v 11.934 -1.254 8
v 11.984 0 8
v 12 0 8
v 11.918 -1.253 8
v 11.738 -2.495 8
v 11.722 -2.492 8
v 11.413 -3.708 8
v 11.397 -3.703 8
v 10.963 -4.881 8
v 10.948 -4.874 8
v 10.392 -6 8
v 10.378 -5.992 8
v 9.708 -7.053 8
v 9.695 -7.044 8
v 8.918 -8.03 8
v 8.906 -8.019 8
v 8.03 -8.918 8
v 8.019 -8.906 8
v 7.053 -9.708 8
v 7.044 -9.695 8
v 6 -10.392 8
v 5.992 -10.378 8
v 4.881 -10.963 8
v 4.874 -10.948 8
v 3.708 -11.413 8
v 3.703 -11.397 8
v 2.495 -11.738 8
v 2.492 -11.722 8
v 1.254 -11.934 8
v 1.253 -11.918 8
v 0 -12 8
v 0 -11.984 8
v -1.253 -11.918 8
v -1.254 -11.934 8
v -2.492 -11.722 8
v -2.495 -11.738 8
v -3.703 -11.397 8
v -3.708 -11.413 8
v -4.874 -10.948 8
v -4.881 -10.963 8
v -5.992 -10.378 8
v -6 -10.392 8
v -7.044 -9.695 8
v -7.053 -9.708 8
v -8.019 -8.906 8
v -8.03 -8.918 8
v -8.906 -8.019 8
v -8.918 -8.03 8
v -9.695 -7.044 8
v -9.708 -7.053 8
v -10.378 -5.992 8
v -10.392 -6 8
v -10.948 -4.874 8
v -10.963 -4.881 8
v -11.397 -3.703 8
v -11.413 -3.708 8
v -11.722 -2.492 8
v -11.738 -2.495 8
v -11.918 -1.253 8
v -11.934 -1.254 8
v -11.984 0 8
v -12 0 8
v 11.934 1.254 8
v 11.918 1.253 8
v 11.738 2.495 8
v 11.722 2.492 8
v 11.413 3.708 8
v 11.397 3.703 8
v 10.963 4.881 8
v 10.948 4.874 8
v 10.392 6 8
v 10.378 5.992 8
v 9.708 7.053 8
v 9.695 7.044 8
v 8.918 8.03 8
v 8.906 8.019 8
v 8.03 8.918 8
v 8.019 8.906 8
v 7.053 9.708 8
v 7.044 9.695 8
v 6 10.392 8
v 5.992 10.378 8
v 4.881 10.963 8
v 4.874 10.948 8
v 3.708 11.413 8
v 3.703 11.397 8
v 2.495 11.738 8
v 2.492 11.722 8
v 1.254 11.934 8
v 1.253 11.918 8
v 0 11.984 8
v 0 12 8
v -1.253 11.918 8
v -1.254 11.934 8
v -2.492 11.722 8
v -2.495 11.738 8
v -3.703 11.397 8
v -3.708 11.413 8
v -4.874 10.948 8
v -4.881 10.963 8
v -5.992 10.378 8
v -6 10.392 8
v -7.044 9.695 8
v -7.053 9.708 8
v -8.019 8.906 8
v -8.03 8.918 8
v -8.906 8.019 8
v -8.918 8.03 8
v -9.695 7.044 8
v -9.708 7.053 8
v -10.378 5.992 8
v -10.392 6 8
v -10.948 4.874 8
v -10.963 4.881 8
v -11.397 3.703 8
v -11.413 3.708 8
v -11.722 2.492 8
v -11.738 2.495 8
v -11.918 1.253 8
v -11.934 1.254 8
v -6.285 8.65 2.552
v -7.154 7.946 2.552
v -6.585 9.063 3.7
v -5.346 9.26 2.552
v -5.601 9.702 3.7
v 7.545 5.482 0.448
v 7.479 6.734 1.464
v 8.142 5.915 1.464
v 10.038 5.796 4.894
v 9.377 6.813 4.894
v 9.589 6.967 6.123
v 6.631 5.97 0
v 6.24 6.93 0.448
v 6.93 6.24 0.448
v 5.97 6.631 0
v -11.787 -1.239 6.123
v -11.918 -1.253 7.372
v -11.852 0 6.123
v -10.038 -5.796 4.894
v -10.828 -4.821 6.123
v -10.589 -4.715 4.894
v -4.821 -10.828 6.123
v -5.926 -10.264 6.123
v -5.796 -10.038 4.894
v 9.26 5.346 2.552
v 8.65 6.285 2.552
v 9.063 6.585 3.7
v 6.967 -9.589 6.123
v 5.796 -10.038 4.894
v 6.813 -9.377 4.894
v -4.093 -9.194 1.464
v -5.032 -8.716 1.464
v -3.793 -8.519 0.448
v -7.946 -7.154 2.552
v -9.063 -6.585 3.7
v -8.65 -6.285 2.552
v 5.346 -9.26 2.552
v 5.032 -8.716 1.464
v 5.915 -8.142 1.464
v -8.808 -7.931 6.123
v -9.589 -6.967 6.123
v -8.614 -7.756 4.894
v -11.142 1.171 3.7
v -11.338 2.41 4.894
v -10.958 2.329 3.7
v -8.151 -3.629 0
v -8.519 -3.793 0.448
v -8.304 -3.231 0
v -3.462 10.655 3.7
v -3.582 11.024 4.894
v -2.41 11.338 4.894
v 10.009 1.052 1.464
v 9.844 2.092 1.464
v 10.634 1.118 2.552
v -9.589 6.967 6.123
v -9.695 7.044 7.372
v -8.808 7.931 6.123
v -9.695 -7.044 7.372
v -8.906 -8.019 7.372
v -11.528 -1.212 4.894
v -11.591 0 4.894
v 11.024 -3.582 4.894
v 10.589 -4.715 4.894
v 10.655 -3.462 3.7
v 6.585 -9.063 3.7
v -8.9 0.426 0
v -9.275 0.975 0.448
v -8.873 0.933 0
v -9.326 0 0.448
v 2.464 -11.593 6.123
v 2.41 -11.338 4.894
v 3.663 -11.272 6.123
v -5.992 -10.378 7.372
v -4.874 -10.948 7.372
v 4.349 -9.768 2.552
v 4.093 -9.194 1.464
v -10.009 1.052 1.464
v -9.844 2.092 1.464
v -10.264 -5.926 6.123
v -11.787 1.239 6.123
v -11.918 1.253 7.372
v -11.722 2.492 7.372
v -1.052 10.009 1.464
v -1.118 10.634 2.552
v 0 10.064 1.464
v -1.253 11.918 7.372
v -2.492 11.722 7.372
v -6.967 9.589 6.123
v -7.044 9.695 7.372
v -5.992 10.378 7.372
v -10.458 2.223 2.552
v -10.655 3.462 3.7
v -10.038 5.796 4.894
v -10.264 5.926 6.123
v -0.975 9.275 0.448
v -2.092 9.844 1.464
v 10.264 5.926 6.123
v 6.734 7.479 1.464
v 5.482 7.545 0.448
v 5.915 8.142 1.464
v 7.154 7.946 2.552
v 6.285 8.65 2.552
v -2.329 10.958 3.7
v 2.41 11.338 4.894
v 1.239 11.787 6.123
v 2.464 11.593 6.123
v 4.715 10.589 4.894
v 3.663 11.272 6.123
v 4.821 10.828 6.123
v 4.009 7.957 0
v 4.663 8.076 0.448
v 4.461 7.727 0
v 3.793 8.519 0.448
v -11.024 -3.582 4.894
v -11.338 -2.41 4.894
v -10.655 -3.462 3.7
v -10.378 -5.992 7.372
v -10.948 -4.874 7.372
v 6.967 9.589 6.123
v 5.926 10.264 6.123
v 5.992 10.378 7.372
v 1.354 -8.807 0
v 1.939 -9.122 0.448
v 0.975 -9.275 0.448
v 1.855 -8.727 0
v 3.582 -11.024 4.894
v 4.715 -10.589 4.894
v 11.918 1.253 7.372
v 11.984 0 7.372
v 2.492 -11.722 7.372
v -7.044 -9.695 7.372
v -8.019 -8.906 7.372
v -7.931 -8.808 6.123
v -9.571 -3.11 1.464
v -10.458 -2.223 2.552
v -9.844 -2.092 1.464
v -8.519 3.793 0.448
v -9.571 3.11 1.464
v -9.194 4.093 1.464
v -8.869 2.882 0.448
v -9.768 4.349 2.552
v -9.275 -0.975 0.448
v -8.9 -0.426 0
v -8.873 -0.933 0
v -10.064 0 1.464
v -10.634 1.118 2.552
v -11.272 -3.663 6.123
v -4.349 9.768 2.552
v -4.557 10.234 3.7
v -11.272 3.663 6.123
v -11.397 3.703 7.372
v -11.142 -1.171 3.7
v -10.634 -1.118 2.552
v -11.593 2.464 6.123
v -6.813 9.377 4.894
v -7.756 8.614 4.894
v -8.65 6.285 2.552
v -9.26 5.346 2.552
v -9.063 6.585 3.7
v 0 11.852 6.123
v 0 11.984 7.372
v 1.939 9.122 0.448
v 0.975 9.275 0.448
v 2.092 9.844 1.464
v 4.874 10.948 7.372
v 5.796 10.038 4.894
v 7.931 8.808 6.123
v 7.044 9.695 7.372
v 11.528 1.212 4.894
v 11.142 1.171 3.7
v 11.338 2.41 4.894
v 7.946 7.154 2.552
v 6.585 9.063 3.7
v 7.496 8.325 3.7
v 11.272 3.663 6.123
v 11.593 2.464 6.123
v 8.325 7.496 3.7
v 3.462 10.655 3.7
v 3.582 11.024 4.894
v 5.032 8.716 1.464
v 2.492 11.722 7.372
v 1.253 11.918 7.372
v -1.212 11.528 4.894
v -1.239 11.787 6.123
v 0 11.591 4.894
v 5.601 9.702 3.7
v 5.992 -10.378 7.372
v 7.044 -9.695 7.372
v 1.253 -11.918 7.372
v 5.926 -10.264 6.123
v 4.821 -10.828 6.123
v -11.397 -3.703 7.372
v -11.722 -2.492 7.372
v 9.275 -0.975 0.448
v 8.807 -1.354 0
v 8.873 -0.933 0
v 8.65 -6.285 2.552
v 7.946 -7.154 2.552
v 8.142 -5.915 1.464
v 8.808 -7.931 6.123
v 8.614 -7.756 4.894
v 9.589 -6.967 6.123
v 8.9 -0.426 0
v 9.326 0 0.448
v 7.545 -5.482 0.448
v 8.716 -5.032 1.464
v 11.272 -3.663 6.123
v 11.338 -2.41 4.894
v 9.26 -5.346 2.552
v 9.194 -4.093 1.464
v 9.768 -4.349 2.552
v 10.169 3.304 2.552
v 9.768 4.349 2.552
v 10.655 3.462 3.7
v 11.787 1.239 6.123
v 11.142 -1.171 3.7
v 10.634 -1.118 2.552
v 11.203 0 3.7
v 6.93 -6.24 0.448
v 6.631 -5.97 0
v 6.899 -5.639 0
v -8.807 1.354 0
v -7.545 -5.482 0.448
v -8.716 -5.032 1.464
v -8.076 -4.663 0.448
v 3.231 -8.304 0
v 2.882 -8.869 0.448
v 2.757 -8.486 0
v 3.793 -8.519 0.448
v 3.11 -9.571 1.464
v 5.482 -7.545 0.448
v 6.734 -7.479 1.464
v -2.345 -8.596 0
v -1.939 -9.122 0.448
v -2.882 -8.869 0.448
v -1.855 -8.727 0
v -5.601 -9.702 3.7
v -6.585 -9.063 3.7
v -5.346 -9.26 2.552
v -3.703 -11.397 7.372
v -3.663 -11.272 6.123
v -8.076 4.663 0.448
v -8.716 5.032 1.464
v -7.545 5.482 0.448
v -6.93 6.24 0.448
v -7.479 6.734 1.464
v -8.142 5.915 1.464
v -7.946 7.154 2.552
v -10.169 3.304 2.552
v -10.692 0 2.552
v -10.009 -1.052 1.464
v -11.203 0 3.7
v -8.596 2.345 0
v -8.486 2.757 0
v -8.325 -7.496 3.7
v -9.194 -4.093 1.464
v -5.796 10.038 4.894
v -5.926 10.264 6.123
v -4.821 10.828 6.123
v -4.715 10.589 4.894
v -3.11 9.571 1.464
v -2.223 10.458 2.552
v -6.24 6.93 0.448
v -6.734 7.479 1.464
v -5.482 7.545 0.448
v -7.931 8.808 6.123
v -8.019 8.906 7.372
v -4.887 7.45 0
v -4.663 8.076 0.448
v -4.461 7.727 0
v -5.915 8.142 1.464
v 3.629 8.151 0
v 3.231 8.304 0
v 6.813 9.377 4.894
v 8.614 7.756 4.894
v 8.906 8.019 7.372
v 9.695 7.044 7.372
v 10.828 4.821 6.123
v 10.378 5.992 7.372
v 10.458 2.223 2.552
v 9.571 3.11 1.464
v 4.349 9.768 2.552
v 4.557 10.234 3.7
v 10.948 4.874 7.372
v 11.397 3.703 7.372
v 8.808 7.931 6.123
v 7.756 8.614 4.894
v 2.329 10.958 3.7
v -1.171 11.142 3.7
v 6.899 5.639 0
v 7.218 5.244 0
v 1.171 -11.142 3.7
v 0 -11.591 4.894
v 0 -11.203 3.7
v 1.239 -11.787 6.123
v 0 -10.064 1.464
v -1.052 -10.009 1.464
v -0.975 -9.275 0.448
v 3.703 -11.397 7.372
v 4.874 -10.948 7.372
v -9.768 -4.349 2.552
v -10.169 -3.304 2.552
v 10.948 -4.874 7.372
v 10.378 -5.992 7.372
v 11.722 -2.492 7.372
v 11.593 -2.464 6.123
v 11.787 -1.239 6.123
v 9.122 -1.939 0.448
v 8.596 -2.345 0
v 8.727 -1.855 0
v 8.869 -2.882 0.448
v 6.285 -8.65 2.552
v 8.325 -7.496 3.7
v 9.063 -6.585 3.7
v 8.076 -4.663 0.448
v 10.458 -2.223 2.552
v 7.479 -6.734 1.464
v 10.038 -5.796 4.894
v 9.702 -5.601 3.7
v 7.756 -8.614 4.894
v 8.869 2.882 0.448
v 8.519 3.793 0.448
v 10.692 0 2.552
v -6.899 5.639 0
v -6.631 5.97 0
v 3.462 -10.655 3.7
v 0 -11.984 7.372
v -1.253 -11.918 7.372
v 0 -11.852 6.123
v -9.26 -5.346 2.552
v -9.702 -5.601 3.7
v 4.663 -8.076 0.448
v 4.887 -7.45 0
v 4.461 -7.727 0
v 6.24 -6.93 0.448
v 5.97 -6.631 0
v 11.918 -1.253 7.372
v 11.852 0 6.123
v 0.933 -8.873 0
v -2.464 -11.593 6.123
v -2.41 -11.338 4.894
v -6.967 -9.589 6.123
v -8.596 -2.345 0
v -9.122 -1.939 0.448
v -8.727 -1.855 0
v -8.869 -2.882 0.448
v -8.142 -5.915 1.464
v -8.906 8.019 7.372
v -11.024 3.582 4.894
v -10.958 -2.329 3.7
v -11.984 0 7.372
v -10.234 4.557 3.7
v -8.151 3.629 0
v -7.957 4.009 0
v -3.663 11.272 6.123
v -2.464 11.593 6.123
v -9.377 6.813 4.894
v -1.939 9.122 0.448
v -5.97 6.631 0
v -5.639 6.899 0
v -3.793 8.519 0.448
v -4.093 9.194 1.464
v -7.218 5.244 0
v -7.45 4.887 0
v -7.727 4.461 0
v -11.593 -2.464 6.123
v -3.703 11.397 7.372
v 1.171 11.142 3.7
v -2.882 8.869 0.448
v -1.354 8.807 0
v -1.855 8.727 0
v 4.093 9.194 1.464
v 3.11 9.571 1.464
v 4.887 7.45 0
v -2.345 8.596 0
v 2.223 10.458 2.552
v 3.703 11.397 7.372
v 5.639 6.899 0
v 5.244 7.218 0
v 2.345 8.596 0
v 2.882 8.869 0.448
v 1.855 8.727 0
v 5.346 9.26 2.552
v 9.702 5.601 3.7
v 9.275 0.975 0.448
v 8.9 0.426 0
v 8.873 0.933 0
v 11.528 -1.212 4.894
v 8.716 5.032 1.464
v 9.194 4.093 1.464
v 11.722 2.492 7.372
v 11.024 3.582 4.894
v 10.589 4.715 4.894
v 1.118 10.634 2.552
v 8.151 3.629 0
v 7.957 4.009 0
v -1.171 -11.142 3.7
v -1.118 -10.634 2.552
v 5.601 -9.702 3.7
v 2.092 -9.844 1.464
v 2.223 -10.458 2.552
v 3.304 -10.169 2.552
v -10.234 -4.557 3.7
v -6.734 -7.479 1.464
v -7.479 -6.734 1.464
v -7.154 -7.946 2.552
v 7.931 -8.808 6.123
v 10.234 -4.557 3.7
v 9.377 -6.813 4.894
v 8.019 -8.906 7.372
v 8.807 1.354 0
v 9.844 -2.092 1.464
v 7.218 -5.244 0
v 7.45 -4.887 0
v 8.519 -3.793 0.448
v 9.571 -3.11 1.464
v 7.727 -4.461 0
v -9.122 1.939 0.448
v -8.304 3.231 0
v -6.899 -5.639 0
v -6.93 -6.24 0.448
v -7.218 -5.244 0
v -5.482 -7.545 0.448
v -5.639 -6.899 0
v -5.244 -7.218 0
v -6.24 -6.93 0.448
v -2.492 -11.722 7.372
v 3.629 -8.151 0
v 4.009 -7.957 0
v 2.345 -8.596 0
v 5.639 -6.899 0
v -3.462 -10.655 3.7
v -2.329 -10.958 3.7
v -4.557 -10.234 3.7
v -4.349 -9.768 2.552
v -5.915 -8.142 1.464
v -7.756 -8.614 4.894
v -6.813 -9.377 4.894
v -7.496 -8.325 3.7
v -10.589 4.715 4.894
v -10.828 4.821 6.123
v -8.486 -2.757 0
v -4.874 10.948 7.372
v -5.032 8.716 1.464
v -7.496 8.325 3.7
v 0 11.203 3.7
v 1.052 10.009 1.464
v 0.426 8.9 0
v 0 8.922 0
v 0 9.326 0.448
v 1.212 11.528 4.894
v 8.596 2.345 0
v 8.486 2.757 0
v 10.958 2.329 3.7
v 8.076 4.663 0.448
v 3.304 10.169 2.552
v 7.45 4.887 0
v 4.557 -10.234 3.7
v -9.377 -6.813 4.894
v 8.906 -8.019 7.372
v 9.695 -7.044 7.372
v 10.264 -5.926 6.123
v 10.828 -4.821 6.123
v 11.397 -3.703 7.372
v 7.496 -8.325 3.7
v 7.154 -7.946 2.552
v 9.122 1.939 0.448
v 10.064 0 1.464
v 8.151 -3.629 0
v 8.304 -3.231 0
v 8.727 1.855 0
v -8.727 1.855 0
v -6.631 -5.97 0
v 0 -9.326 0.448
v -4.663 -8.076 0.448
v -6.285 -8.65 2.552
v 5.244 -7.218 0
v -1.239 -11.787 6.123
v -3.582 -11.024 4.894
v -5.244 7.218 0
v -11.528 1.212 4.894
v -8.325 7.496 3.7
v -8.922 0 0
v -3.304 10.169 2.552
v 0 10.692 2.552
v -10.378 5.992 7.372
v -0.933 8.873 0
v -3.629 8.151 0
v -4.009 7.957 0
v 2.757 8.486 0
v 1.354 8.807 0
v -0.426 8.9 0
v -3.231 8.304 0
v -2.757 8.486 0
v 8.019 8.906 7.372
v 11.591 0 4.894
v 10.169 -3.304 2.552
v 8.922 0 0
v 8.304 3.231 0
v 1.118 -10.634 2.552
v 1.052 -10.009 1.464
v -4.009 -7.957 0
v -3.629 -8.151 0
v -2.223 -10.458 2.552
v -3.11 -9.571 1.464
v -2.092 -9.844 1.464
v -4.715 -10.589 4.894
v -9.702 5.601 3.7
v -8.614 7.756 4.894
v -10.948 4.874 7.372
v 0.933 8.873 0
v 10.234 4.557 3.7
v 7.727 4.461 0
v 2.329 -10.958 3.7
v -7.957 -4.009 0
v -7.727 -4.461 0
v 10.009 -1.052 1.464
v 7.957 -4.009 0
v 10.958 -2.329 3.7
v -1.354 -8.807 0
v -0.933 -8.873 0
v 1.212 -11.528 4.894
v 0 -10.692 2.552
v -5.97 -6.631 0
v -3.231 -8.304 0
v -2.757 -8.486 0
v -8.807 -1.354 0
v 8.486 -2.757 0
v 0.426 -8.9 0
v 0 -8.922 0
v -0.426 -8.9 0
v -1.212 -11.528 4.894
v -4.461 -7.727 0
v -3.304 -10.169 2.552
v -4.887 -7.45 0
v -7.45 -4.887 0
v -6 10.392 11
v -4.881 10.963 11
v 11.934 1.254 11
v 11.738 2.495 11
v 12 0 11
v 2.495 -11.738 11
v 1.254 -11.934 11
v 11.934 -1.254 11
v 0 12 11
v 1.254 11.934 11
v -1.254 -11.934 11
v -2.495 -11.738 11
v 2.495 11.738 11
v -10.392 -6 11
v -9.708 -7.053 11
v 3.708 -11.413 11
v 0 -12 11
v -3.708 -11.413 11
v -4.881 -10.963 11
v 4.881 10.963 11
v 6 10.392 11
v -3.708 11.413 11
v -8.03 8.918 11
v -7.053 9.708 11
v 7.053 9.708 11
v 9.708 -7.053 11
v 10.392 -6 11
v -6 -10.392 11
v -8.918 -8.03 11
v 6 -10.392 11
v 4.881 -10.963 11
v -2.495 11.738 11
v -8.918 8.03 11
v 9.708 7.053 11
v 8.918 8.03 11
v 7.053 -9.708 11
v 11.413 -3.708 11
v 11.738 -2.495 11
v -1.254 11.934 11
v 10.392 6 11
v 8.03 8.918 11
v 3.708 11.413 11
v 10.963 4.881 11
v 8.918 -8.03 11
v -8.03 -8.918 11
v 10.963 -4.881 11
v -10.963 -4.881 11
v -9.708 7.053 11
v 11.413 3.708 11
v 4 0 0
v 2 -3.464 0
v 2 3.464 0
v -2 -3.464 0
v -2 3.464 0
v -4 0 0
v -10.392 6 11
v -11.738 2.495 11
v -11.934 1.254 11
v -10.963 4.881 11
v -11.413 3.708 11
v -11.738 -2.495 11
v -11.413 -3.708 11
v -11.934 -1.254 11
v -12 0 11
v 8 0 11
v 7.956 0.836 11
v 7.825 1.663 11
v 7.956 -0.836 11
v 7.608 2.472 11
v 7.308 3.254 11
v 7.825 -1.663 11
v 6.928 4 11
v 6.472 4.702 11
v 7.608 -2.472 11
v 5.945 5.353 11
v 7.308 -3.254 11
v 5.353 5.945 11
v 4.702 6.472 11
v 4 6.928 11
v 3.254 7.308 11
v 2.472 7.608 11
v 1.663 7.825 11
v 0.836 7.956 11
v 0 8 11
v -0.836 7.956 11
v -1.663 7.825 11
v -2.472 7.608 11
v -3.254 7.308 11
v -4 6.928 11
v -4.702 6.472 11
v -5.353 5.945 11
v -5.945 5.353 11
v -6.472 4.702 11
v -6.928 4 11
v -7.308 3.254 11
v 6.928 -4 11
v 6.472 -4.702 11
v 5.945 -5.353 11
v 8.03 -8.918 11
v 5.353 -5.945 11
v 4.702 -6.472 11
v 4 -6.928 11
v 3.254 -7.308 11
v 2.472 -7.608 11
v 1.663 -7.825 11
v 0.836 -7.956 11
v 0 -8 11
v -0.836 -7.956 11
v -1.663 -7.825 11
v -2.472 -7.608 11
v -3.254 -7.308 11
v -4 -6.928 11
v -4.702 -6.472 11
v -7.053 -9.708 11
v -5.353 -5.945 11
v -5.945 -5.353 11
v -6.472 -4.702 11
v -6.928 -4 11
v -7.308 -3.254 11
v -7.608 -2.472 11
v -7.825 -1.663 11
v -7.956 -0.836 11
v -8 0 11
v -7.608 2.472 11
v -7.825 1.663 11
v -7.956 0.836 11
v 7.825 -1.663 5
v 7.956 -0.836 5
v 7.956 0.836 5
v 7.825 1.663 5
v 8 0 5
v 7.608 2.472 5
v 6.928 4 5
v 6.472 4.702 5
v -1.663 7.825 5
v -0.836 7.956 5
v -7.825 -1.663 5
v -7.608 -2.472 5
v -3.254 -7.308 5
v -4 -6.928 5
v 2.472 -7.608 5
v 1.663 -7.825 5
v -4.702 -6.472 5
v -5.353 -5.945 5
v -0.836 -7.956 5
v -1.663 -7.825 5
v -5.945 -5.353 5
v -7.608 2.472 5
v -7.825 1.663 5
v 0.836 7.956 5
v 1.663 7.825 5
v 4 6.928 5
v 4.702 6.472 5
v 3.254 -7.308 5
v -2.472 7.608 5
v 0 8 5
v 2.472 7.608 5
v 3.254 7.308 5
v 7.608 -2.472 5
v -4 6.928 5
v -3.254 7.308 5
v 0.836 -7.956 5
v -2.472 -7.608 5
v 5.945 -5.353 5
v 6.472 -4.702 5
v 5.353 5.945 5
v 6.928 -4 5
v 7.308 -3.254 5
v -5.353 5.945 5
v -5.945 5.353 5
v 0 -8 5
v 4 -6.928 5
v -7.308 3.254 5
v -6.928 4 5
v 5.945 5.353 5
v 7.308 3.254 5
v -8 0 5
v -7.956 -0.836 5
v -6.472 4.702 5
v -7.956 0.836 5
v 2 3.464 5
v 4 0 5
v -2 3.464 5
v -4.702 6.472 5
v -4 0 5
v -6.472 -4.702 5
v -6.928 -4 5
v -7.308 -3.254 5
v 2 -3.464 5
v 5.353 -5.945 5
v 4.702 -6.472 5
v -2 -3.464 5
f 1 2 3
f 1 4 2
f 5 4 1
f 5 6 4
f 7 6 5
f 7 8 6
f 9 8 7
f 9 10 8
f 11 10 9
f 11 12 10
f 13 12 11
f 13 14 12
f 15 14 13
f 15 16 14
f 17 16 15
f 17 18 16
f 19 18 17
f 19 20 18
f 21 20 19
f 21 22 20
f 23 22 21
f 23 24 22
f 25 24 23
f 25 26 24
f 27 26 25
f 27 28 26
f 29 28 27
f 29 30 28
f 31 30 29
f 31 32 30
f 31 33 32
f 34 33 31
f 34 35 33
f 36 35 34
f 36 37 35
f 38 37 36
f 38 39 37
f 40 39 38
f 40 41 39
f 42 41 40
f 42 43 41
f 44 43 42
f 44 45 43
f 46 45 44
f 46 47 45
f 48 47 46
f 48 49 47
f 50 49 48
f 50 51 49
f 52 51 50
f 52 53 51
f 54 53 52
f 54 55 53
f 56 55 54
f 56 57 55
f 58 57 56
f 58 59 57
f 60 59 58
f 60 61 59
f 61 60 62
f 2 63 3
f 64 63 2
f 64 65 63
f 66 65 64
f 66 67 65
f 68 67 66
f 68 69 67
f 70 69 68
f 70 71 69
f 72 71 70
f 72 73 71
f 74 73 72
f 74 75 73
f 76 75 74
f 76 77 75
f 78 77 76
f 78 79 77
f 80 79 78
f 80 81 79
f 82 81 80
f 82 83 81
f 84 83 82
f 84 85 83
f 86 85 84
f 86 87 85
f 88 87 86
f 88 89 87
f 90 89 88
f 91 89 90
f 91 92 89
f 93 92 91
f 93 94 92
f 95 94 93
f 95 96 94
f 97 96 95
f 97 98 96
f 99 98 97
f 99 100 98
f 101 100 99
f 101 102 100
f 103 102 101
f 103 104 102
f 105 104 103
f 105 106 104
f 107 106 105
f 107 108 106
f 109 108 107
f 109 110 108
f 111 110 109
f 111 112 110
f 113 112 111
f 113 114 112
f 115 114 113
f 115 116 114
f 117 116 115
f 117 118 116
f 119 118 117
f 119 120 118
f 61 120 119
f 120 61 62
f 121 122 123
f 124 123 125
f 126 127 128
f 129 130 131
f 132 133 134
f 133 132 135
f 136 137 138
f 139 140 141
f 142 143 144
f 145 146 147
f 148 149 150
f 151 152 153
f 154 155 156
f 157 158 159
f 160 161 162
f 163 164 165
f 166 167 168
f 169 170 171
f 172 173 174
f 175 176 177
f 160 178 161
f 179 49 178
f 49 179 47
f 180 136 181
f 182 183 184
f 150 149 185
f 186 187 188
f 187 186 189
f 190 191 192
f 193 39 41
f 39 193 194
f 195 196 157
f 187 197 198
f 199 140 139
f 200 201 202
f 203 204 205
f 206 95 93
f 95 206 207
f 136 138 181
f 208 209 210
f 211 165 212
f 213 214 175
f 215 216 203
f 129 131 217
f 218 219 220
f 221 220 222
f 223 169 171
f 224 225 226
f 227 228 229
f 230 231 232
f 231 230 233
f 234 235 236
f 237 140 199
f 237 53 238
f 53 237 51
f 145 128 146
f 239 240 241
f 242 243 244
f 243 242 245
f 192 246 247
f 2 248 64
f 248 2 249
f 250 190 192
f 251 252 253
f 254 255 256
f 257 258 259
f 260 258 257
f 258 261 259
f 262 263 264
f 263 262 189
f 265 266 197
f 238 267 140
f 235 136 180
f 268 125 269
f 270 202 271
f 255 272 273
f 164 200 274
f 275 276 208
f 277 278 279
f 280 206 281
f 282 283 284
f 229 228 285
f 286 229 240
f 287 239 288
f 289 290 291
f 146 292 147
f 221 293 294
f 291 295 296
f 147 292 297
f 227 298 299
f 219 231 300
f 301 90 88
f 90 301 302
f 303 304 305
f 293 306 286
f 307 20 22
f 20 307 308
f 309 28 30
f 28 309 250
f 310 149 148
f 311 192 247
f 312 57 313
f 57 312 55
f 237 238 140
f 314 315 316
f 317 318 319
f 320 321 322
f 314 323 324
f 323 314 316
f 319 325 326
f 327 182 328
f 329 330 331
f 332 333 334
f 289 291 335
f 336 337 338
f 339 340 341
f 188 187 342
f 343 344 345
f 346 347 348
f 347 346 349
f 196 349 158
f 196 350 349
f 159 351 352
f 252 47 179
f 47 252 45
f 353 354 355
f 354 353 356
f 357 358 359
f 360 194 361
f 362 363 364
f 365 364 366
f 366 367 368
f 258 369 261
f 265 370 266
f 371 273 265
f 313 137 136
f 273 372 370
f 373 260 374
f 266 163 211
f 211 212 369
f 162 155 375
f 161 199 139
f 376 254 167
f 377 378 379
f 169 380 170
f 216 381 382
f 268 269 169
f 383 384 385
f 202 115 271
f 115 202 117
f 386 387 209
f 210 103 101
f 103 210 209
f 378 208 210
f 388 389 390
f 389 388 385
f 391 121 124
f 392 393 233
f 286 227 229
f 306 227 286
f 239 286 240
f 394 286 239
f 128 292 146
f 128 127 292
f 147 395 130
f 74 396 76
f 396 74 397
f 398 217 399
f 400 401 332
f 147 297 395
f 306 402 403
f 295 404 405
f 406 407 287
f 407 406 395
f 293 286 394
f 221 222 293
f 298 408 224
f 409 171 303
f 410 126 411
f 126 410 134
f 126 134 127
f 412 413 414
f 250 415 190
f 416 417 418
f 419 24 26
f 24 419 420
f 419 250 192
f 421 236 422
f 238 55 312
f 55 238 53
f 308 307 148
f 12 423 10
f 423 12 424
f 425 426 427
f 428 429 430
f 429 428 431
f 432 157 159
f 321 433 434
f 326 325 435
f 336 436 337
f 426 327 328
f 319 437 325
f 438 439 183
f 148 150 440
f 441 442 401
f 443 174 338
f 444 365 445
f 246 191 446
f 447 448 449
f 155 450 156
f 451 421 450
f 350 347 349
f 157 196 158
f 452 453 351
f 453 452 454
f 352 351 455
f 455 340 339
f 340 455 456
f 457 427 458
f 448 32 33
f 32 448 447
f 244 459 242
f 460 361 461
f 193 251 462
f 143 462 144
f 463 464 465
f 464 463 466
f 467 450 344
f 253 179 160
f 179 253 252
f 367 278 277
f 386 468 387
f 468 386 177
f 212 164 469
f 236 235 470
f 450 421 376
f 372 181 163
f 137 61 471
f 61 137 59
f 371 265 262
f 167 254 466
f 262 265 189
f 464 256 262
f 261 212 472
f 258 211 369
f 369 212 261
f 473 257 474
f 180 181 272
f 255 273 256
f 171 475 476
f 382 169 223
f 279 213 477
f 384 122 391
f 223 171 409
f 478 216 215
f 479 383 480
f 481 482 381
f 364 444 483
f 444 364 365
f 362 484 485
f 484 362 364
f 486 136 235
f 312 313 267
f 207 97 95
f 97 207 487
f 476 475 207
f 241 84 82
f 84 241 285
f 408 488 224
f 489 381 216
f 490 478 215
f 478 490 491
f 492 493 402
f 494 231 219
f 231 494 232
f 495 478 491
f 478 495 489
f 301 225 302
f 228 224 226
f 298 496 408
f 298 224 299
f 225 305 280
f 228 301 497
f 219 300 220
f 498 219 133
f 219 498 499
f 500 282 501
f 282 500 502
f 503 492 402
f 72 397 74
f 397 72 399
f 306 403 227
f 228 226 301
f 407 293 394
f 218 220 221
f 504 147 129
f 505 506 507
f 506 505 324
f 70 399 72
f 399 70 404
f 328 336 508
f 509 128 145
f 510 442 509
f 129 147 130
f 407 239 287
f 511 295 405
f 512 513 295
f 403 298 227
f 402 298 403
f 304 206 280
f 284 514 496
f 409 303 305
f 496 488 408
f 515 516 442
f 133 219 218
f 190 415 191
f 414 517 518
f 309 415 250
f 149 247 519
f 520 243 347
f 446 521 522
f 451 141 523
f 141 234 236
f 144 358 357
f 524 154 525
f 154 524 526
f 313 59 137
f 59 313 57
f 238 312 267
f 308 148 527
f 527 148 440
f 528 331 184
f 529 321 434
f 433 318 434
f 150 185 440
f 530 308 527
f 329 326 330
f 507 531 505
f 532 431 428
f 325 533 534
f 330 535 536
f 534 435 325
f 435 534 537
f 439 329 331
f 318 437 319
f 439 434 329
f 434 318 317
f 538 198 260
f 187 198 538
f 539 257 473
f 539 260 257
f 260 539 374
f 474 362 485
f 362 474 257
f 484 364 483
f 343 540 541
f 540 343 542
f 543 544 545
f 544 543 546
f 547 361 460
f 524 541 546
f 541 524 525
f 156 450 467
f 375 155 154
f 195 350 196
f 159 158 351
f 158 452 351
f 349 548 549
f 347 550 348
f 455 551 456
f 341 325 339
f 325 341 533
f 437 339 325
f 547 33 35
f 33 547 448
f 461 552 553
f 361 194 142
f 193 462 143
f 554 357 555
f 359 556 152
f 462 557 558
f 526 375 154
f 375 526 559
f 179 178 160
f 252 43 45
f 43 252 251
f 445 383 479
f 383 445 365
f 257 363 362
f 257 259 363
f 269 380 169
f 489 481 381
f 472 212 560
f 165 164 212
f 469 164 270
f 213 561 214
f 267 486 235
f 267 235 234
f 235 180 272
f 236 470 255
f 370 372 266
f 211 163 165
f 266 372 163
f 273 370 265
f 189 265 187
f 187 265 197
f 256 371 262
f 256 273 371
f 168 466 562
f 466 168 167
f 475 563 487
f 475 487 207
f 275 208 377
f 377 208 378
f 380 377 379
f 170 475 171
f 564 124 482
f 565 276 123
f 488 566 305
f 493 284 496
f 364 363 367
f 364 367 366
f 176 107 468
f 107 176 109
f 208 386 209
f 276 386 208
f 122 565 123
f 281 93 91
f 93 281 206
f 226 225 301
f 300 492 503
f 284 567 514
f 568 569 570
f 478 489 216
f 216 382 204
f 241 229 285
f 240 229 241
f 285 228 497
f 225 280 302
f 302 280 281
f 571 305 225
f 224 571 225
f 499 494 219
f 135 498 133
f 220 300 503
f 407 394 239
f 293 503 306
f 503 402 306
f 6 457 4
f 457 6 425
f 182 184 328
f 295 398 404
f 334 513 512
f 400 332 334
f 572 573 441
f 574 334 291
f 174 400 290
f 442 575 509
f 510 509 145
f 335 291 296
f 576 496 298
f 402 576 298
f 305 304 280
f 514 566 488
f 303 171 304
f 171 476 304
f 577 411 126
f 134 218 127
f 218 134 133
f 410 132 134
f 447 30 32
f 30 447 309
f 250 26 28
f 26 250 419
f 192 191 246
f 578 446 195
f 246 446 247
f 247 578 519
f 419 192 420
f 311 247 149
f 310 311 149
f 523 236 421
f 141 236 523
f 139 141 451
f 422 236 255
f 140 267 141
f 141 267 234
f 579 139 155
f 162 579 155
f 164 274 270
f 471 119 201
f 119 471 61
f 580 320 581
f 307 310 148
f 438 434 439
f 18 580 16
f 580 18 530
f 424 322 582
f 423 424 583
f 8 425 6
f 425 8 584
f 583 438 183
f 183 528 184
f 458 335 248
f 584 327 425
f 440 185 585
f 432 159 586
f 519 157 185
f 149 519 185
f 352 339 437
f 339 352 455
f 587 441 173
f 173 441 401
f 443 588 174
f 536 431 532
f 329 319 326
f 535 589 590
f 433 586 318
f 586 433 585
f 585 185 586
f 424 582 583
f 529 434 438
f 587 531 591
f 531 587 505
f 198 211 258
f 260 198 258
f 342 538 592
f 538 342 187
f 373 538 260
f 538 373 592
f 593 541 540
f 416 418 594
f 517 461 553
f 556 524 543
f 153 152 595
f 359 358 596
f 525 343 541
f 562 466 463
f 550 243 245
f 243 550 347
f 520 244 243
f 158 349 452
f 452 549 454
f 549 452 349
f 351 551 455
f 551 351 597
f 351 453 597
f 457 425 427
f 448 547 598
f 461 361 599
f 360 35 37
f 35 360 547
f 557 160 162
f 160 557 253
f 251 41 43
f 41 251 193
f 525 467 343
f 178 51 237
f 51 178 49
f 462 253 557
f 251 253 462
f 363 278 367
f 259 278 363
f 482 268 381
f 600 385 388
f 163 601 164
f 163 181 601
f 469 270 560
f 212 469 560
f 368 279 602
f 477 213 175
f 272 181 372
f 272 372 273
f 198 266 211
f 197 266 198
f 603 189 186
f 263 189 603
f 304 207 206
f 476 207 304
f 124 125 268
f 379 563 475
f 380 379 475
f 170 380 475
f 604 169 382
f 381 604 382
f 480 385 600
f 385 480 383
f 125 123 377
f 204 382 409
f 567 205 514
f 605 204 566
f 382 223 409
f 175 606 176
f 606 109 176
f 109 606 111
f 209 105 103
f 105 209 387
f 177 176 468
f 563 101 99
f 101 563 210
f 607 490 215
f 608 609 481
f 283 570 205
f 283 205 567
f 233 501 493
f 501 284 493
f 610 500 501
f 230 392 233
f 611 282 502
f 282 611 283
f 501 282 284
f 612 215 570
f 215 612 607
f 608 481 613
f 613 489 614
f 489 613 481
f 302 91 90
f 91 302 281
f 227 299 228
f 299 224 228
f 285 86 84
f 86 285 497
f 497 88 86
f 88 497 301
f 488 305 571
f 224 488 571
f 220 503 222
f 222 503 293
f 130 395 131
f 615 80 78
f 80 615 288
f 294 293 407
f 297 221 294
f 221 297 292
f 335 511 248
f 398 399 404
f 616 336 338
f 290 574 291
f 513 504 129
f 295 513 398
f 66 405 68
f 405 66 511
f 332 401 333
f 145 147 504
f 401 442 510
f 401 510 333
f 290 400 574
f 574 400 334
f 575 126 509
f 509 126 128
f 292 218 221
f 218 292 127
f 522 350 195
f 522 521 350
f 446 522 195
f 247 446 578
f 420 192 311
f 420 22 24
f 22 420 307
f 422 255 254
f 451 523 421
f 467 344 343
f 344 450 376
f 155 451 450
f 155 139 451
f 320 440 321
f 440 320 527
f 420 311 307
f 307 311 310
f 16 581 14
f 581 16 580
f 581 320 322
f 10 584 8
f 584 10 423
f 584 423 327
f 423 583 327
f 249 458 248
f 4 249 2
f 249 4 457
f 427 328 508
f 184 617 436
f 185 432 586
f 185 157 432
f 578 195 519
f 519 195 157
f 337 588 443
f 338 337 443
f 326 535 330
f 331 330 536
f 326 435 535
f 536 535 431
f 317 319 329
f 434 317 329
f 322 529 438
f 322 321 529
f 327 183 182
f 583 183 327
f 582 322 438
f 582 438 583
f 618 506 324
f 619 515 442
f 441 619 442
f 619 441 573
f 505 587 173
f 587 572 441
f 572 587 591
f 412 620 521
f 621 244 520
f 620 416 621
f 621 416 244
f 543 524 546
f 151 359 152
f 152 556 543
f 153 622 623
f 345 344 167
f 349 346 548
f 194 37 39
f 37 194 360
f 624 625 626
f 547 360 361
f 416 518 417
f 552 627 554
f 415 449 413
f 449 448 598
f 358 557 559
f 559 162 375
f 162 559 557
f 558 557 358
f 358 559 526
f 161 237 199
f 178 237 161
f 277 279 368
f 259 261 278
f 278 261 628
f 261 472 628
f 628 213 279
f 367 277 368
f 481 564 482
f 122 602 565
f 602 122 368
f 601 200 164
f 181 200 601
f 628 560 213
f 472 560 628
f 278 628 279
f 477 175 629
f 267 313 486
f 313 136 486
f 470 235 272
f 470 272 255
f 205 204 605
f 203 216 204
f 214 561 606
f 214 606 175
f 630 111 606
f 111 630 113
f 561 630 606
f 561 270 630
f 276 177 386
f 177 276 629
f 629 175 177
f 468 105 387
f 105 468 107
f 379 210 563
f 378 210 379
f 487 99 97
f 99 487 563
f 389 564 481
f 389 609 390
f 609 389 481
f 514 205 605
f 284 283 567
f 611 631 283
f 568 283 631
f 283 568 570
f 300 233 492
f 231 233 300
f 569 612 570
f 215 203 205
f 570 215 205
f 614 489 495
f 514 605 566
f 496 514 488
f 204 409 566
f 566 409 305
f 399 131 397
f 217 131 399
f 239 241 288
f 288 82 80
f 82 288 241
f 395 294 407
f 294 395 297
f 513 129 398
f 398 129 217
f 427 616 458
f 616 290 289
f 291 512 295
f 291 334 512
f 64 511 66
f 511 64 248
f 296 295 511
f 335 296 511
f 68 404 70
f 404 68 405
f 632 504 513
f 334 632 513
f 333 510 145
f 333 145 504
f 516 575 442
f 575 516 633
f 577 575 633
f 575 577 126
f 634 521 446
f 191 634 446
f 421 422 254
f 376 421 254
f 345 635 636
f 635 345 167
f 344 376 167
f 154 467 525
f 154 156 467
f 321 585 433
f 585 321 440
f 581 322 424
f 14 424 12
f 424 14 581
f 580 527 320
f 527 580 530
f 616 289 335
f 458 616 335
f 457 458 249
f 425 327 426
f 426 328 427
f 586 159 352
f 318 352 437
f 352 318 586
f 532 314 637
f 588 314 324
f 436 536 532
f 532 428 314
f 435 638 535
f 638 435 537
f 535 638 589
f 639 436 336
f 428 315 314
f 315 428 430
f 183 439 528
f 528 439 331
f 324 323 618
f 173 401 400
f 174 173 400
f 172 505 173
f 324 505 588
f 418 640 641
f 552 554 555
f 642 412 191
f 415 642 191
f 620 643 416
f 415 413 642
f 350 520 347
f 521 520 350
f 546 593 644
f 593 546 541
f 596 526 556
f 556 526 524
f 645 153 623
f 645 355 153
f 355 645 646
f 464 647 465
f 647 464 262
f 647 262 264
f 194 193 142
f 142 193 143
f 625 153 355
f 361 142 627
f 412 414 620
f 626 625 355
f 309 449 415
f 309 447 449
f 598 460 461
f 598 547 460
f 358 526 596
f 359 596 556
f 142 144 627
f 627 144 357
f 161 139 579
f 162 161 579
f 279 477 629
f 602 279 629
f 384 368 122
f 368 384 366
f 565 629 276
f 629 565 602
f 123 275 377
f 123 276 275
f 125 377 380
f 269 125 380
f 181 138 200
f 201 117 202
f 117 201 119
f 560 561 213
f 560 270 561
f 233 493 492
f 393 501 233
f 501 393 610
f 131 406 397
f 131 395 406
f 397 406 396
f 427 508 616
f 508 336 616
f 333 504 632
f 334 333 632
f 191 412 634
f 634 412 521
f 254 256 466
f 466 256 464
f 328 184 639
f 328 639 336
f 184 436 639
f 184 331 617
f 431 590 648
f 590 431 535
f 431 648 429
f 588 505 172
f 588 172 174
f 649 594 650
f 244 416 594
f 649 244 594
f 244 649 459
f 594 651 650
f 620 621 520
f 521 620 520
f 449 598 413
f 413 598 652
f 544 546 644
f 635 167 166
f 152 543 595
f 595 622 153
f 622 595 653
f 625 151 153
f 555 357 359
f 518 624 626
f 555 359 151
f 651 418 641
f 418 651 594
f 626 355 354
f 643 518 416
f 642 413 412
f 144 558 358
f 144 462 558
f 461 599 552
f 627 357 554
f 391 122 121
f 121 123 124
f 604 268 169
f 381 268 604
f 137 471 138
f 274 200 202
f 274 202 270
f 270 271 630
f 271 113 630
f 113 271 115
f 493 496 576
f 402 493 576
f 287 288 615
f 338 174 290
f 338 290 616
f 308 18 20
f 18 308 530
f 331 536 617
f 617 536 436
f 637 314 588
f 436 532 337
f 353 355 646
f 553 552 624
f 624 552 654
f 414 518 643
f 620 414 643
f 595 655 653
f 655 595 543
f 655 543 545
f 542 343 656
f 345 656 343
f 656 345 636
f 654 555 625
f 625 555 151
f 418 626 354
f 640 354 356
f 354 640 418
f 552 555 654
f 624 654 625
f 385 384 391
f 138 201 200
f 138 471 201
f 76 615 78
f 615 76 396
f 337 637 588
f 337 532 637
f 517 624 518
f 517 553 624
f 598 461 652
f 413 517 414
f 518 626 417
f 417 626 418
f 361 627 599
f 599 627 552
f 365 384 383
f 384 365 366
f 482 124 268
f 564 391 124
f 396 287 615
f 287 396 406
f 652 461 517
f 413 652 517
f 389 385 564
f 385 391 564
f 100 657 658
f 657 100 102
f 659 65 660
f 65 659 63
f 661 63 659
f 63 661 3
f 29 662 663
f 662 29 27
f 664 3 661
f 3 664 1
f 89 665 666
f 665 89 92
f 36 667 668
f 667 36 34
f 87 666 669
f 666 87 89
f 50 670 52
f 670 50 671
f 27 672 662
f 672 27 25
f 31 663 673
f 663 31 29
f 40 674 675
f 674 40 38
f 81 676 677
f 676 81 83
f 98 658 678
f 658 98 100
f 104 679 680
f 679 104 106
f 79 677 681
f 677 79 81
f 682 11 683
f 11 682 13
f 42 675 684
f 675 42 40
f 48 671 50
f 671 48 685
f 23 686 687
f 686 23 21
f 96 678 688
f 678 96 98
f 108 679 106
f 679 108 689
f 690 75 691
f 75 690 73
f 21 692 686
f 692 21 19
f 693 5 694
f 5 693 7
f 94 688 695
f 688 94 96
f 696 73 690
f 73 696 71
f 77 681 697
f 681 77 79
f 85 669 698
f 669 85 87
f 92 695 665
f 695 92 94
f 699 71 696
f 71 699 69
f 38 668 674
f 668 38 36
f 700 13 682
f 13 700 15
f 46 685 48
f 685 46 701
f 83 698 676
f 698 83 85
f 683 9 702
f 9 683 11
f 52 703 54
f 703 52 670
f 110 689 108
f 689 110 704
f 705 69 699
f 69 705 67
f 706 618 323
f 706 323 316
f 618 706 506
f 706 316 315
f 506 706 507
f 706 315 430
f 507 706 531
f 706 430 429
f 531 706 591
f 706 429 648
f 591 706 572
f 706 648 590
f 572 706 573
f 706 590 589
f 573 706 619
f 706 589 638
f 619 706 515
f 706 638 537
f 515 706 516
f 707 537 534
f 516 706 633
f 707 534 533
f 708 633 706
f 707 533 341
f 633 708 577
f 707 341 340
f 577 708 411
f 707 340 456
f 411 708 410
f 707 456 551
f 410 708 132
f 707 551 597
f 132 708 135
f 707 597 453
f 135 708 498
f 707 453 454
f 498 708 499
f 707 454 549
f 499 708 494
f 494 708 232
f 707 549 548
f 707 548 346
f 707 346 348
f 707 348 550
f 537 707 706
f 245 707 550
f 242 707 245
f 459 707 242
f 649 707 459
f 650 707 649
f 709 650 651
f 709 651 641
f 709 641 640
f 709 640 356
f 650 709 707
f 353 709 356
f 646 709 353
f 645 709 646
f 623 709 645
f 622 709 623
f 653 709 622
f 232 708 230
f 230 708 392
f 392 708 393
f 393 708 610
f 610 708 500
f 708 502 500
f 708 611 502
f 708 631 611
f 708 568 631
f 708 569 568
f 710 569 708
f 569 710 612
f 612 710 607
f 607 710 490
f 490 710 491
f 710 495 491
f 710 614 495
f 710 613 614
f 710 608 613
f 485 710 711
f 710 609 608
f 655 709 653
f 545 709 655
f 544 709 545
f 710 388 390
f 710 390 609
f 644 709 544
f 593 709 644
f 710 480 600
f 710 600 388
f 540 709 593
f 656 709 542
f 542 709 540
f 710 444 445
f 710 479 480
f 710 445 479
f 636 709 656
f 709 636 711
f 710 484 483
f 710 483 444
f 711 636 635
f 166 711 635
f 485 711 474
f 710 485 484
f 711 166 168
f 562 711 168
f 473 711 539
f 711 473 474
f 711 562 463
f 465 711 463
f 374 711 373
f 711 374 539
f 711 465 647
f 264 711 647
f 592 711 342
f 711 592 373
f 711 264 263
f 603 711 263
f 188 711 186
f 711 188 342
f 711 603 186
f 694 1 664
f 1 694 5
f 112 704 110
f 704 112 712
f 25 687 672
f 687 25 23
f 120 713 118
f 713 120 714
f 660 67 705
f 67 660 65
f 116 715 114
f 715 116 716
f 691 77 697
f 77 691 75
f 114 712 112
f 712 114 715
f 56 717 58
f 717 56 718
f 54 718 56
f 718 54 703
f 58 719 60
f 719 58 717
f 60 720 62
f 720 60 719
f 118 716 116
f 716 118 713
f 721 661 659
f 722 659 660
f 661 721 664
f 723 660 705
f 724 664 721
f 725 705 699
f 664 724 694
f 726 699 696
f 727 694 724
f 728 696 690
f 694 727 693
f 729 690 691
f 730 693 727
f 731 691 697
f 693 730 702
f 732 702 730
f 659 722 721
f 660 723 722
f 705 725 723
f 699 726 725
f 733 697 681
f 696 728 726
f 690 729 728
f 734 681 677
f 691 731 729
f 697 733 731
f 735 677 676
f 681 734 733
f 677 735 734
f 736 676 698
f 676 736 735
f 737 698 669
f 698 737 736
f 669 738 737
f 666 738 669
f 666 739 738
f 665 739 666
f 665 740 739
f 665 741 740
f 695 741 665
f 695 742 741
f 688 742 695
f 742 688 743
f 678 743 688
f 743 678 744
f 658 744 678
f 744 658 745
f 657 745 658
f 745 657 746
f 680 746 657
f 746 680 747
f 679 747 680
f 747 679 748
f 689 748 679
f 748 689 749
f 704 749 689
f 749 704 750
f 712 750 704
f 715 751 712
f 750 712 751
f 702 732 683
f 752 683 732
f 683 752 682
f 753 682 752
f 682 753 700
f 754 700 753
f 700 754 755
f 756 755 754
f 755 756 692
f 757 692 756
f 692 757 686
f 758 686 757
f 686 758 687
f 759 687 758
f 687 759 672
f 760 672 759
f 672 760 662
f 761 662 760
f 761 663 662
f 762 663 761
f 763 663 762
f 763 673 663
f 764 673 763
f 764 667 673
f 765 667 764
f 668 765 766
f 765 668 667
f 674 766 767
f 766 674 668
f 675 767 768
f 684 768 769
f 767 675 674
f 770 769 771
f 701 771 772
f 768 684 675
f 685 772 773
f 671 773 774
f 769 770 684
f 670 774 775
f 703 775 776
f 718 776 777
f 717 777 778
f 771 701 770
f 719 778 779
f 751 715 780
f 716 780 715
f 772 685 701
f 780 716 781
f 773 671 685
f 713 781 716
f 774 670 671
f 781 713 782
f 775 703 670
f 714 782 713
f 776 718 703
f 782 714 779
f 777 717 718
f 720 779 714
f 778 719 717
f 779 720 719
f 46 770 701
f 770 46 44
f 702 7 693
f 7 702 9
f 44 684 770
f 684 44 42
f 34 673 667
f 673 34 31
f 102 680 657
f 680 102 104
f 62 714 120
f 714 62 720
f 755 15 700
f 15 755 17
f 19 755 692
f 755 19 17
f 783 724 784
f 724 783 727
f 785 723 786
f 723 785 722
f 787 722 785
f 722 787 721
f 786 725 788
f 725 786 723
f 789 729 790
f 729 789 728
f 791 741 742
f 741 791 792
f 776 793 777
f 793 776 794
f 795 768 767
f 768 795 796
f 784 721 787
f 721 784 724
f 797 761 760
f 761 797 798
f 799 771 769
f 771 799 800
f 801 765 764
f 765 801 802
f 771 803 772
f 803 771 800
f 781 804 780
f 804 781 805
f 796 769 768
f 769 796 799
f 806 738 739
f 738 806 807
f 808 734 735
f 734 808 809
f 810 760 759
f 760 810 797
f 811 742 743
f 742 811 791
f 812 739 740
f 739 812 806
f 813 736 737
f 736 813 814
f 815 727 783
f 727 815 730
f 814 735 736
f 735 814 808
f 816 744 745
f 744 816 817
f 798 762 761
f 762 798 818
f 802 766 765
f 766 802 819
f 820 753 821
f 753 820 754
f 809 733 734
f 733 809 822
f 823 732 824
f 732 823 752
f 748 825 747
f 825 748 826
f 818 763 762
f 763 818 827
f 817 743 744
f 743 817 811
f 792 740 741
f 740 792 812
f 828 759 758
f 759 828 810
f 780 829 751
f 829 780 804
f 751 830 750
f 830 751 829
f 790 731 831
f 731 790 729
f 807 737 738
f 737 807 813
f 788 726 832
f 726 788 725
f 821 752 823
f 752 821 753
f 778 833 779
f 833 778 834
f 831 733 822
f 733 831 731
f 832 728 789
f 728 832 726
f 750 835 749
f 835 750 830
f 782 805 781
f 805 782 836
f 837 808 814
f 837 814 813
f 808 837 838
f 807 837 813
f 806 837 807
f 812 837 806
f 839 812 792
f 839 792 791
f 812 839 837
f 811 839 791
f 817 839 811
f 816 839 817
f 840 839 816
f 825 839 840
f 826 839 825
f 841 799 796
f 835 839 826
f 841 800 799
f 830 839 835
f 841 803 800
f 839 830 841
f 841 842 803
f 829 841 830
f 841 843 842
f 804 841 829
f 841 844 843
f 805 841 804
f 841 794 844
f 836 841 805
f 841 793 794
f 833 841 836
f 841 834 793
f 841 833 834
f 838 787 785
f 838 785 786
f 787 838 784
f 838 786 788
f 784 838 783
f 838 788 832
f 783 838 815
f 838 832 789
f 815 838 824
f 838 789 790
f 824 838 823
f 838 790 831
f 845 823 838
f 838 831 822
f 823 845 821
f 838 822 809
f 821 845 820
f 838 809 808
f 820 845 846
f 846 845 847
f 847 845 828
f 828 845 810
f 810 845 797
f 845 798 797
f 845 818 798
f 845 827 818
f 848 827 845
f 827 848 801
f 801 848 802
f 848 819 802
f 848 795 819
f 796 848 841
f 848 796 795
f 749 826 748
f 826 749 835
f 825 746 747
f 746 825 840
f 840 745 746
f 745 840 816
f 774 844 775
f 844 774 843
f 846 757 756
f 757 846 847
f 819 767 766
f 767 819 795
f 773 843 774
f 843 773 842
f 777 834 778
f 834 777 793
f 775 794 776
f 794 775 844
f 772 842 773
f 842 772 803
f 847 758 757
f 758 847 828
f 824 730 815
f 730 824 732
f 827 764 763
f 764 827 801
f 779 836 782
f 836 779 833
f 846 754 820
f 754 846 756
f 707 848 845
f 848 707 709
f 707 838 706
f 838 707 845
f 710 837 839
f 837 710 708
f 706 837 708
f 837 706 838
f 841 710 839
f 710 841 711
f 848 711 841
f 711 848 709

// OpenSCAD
hTotaal   = 16;  // gedeelte van bitje dat uit bithouder steekt
dBout     = 8;   // gat om hex te vorm
gatDiepte = 3.5; // hoever steekt het bitje in de schroef 
diepte    = 1.5;   // hoever mag de schroef het hout in, NEG is boven het hout
kraag     = 5;   // uitstekende hex gedeelte van bitje

// berekende waarden
h = hTotaal - diepte - gatDiepte;


bit();

module bit() {
    dOuter = dBout * 3;
    difference () {
        shell(d = dOuter);
        translate([0, 0, kraag]) 
            shell(d = dBout * 2);
        hex();
        translate([0, 0, dOuter / 3]) 
            rounder(d = dOuter);
    }
}

module shell(d = 10) {
    cylinder(d=d, h = h, $fn = 60); 
}

module hex() {
    cylinder(d=dBout, h = h * 3, $fn = 6, center = true); 
}

module rounder(d = 10) {
    c = [d, d, d] * 1.1;
    difference() {
        translate([0, 0, -c.z / 2])
        cube(c, center = true);
        sphere(d=d, $fn = 60);
    }
}
